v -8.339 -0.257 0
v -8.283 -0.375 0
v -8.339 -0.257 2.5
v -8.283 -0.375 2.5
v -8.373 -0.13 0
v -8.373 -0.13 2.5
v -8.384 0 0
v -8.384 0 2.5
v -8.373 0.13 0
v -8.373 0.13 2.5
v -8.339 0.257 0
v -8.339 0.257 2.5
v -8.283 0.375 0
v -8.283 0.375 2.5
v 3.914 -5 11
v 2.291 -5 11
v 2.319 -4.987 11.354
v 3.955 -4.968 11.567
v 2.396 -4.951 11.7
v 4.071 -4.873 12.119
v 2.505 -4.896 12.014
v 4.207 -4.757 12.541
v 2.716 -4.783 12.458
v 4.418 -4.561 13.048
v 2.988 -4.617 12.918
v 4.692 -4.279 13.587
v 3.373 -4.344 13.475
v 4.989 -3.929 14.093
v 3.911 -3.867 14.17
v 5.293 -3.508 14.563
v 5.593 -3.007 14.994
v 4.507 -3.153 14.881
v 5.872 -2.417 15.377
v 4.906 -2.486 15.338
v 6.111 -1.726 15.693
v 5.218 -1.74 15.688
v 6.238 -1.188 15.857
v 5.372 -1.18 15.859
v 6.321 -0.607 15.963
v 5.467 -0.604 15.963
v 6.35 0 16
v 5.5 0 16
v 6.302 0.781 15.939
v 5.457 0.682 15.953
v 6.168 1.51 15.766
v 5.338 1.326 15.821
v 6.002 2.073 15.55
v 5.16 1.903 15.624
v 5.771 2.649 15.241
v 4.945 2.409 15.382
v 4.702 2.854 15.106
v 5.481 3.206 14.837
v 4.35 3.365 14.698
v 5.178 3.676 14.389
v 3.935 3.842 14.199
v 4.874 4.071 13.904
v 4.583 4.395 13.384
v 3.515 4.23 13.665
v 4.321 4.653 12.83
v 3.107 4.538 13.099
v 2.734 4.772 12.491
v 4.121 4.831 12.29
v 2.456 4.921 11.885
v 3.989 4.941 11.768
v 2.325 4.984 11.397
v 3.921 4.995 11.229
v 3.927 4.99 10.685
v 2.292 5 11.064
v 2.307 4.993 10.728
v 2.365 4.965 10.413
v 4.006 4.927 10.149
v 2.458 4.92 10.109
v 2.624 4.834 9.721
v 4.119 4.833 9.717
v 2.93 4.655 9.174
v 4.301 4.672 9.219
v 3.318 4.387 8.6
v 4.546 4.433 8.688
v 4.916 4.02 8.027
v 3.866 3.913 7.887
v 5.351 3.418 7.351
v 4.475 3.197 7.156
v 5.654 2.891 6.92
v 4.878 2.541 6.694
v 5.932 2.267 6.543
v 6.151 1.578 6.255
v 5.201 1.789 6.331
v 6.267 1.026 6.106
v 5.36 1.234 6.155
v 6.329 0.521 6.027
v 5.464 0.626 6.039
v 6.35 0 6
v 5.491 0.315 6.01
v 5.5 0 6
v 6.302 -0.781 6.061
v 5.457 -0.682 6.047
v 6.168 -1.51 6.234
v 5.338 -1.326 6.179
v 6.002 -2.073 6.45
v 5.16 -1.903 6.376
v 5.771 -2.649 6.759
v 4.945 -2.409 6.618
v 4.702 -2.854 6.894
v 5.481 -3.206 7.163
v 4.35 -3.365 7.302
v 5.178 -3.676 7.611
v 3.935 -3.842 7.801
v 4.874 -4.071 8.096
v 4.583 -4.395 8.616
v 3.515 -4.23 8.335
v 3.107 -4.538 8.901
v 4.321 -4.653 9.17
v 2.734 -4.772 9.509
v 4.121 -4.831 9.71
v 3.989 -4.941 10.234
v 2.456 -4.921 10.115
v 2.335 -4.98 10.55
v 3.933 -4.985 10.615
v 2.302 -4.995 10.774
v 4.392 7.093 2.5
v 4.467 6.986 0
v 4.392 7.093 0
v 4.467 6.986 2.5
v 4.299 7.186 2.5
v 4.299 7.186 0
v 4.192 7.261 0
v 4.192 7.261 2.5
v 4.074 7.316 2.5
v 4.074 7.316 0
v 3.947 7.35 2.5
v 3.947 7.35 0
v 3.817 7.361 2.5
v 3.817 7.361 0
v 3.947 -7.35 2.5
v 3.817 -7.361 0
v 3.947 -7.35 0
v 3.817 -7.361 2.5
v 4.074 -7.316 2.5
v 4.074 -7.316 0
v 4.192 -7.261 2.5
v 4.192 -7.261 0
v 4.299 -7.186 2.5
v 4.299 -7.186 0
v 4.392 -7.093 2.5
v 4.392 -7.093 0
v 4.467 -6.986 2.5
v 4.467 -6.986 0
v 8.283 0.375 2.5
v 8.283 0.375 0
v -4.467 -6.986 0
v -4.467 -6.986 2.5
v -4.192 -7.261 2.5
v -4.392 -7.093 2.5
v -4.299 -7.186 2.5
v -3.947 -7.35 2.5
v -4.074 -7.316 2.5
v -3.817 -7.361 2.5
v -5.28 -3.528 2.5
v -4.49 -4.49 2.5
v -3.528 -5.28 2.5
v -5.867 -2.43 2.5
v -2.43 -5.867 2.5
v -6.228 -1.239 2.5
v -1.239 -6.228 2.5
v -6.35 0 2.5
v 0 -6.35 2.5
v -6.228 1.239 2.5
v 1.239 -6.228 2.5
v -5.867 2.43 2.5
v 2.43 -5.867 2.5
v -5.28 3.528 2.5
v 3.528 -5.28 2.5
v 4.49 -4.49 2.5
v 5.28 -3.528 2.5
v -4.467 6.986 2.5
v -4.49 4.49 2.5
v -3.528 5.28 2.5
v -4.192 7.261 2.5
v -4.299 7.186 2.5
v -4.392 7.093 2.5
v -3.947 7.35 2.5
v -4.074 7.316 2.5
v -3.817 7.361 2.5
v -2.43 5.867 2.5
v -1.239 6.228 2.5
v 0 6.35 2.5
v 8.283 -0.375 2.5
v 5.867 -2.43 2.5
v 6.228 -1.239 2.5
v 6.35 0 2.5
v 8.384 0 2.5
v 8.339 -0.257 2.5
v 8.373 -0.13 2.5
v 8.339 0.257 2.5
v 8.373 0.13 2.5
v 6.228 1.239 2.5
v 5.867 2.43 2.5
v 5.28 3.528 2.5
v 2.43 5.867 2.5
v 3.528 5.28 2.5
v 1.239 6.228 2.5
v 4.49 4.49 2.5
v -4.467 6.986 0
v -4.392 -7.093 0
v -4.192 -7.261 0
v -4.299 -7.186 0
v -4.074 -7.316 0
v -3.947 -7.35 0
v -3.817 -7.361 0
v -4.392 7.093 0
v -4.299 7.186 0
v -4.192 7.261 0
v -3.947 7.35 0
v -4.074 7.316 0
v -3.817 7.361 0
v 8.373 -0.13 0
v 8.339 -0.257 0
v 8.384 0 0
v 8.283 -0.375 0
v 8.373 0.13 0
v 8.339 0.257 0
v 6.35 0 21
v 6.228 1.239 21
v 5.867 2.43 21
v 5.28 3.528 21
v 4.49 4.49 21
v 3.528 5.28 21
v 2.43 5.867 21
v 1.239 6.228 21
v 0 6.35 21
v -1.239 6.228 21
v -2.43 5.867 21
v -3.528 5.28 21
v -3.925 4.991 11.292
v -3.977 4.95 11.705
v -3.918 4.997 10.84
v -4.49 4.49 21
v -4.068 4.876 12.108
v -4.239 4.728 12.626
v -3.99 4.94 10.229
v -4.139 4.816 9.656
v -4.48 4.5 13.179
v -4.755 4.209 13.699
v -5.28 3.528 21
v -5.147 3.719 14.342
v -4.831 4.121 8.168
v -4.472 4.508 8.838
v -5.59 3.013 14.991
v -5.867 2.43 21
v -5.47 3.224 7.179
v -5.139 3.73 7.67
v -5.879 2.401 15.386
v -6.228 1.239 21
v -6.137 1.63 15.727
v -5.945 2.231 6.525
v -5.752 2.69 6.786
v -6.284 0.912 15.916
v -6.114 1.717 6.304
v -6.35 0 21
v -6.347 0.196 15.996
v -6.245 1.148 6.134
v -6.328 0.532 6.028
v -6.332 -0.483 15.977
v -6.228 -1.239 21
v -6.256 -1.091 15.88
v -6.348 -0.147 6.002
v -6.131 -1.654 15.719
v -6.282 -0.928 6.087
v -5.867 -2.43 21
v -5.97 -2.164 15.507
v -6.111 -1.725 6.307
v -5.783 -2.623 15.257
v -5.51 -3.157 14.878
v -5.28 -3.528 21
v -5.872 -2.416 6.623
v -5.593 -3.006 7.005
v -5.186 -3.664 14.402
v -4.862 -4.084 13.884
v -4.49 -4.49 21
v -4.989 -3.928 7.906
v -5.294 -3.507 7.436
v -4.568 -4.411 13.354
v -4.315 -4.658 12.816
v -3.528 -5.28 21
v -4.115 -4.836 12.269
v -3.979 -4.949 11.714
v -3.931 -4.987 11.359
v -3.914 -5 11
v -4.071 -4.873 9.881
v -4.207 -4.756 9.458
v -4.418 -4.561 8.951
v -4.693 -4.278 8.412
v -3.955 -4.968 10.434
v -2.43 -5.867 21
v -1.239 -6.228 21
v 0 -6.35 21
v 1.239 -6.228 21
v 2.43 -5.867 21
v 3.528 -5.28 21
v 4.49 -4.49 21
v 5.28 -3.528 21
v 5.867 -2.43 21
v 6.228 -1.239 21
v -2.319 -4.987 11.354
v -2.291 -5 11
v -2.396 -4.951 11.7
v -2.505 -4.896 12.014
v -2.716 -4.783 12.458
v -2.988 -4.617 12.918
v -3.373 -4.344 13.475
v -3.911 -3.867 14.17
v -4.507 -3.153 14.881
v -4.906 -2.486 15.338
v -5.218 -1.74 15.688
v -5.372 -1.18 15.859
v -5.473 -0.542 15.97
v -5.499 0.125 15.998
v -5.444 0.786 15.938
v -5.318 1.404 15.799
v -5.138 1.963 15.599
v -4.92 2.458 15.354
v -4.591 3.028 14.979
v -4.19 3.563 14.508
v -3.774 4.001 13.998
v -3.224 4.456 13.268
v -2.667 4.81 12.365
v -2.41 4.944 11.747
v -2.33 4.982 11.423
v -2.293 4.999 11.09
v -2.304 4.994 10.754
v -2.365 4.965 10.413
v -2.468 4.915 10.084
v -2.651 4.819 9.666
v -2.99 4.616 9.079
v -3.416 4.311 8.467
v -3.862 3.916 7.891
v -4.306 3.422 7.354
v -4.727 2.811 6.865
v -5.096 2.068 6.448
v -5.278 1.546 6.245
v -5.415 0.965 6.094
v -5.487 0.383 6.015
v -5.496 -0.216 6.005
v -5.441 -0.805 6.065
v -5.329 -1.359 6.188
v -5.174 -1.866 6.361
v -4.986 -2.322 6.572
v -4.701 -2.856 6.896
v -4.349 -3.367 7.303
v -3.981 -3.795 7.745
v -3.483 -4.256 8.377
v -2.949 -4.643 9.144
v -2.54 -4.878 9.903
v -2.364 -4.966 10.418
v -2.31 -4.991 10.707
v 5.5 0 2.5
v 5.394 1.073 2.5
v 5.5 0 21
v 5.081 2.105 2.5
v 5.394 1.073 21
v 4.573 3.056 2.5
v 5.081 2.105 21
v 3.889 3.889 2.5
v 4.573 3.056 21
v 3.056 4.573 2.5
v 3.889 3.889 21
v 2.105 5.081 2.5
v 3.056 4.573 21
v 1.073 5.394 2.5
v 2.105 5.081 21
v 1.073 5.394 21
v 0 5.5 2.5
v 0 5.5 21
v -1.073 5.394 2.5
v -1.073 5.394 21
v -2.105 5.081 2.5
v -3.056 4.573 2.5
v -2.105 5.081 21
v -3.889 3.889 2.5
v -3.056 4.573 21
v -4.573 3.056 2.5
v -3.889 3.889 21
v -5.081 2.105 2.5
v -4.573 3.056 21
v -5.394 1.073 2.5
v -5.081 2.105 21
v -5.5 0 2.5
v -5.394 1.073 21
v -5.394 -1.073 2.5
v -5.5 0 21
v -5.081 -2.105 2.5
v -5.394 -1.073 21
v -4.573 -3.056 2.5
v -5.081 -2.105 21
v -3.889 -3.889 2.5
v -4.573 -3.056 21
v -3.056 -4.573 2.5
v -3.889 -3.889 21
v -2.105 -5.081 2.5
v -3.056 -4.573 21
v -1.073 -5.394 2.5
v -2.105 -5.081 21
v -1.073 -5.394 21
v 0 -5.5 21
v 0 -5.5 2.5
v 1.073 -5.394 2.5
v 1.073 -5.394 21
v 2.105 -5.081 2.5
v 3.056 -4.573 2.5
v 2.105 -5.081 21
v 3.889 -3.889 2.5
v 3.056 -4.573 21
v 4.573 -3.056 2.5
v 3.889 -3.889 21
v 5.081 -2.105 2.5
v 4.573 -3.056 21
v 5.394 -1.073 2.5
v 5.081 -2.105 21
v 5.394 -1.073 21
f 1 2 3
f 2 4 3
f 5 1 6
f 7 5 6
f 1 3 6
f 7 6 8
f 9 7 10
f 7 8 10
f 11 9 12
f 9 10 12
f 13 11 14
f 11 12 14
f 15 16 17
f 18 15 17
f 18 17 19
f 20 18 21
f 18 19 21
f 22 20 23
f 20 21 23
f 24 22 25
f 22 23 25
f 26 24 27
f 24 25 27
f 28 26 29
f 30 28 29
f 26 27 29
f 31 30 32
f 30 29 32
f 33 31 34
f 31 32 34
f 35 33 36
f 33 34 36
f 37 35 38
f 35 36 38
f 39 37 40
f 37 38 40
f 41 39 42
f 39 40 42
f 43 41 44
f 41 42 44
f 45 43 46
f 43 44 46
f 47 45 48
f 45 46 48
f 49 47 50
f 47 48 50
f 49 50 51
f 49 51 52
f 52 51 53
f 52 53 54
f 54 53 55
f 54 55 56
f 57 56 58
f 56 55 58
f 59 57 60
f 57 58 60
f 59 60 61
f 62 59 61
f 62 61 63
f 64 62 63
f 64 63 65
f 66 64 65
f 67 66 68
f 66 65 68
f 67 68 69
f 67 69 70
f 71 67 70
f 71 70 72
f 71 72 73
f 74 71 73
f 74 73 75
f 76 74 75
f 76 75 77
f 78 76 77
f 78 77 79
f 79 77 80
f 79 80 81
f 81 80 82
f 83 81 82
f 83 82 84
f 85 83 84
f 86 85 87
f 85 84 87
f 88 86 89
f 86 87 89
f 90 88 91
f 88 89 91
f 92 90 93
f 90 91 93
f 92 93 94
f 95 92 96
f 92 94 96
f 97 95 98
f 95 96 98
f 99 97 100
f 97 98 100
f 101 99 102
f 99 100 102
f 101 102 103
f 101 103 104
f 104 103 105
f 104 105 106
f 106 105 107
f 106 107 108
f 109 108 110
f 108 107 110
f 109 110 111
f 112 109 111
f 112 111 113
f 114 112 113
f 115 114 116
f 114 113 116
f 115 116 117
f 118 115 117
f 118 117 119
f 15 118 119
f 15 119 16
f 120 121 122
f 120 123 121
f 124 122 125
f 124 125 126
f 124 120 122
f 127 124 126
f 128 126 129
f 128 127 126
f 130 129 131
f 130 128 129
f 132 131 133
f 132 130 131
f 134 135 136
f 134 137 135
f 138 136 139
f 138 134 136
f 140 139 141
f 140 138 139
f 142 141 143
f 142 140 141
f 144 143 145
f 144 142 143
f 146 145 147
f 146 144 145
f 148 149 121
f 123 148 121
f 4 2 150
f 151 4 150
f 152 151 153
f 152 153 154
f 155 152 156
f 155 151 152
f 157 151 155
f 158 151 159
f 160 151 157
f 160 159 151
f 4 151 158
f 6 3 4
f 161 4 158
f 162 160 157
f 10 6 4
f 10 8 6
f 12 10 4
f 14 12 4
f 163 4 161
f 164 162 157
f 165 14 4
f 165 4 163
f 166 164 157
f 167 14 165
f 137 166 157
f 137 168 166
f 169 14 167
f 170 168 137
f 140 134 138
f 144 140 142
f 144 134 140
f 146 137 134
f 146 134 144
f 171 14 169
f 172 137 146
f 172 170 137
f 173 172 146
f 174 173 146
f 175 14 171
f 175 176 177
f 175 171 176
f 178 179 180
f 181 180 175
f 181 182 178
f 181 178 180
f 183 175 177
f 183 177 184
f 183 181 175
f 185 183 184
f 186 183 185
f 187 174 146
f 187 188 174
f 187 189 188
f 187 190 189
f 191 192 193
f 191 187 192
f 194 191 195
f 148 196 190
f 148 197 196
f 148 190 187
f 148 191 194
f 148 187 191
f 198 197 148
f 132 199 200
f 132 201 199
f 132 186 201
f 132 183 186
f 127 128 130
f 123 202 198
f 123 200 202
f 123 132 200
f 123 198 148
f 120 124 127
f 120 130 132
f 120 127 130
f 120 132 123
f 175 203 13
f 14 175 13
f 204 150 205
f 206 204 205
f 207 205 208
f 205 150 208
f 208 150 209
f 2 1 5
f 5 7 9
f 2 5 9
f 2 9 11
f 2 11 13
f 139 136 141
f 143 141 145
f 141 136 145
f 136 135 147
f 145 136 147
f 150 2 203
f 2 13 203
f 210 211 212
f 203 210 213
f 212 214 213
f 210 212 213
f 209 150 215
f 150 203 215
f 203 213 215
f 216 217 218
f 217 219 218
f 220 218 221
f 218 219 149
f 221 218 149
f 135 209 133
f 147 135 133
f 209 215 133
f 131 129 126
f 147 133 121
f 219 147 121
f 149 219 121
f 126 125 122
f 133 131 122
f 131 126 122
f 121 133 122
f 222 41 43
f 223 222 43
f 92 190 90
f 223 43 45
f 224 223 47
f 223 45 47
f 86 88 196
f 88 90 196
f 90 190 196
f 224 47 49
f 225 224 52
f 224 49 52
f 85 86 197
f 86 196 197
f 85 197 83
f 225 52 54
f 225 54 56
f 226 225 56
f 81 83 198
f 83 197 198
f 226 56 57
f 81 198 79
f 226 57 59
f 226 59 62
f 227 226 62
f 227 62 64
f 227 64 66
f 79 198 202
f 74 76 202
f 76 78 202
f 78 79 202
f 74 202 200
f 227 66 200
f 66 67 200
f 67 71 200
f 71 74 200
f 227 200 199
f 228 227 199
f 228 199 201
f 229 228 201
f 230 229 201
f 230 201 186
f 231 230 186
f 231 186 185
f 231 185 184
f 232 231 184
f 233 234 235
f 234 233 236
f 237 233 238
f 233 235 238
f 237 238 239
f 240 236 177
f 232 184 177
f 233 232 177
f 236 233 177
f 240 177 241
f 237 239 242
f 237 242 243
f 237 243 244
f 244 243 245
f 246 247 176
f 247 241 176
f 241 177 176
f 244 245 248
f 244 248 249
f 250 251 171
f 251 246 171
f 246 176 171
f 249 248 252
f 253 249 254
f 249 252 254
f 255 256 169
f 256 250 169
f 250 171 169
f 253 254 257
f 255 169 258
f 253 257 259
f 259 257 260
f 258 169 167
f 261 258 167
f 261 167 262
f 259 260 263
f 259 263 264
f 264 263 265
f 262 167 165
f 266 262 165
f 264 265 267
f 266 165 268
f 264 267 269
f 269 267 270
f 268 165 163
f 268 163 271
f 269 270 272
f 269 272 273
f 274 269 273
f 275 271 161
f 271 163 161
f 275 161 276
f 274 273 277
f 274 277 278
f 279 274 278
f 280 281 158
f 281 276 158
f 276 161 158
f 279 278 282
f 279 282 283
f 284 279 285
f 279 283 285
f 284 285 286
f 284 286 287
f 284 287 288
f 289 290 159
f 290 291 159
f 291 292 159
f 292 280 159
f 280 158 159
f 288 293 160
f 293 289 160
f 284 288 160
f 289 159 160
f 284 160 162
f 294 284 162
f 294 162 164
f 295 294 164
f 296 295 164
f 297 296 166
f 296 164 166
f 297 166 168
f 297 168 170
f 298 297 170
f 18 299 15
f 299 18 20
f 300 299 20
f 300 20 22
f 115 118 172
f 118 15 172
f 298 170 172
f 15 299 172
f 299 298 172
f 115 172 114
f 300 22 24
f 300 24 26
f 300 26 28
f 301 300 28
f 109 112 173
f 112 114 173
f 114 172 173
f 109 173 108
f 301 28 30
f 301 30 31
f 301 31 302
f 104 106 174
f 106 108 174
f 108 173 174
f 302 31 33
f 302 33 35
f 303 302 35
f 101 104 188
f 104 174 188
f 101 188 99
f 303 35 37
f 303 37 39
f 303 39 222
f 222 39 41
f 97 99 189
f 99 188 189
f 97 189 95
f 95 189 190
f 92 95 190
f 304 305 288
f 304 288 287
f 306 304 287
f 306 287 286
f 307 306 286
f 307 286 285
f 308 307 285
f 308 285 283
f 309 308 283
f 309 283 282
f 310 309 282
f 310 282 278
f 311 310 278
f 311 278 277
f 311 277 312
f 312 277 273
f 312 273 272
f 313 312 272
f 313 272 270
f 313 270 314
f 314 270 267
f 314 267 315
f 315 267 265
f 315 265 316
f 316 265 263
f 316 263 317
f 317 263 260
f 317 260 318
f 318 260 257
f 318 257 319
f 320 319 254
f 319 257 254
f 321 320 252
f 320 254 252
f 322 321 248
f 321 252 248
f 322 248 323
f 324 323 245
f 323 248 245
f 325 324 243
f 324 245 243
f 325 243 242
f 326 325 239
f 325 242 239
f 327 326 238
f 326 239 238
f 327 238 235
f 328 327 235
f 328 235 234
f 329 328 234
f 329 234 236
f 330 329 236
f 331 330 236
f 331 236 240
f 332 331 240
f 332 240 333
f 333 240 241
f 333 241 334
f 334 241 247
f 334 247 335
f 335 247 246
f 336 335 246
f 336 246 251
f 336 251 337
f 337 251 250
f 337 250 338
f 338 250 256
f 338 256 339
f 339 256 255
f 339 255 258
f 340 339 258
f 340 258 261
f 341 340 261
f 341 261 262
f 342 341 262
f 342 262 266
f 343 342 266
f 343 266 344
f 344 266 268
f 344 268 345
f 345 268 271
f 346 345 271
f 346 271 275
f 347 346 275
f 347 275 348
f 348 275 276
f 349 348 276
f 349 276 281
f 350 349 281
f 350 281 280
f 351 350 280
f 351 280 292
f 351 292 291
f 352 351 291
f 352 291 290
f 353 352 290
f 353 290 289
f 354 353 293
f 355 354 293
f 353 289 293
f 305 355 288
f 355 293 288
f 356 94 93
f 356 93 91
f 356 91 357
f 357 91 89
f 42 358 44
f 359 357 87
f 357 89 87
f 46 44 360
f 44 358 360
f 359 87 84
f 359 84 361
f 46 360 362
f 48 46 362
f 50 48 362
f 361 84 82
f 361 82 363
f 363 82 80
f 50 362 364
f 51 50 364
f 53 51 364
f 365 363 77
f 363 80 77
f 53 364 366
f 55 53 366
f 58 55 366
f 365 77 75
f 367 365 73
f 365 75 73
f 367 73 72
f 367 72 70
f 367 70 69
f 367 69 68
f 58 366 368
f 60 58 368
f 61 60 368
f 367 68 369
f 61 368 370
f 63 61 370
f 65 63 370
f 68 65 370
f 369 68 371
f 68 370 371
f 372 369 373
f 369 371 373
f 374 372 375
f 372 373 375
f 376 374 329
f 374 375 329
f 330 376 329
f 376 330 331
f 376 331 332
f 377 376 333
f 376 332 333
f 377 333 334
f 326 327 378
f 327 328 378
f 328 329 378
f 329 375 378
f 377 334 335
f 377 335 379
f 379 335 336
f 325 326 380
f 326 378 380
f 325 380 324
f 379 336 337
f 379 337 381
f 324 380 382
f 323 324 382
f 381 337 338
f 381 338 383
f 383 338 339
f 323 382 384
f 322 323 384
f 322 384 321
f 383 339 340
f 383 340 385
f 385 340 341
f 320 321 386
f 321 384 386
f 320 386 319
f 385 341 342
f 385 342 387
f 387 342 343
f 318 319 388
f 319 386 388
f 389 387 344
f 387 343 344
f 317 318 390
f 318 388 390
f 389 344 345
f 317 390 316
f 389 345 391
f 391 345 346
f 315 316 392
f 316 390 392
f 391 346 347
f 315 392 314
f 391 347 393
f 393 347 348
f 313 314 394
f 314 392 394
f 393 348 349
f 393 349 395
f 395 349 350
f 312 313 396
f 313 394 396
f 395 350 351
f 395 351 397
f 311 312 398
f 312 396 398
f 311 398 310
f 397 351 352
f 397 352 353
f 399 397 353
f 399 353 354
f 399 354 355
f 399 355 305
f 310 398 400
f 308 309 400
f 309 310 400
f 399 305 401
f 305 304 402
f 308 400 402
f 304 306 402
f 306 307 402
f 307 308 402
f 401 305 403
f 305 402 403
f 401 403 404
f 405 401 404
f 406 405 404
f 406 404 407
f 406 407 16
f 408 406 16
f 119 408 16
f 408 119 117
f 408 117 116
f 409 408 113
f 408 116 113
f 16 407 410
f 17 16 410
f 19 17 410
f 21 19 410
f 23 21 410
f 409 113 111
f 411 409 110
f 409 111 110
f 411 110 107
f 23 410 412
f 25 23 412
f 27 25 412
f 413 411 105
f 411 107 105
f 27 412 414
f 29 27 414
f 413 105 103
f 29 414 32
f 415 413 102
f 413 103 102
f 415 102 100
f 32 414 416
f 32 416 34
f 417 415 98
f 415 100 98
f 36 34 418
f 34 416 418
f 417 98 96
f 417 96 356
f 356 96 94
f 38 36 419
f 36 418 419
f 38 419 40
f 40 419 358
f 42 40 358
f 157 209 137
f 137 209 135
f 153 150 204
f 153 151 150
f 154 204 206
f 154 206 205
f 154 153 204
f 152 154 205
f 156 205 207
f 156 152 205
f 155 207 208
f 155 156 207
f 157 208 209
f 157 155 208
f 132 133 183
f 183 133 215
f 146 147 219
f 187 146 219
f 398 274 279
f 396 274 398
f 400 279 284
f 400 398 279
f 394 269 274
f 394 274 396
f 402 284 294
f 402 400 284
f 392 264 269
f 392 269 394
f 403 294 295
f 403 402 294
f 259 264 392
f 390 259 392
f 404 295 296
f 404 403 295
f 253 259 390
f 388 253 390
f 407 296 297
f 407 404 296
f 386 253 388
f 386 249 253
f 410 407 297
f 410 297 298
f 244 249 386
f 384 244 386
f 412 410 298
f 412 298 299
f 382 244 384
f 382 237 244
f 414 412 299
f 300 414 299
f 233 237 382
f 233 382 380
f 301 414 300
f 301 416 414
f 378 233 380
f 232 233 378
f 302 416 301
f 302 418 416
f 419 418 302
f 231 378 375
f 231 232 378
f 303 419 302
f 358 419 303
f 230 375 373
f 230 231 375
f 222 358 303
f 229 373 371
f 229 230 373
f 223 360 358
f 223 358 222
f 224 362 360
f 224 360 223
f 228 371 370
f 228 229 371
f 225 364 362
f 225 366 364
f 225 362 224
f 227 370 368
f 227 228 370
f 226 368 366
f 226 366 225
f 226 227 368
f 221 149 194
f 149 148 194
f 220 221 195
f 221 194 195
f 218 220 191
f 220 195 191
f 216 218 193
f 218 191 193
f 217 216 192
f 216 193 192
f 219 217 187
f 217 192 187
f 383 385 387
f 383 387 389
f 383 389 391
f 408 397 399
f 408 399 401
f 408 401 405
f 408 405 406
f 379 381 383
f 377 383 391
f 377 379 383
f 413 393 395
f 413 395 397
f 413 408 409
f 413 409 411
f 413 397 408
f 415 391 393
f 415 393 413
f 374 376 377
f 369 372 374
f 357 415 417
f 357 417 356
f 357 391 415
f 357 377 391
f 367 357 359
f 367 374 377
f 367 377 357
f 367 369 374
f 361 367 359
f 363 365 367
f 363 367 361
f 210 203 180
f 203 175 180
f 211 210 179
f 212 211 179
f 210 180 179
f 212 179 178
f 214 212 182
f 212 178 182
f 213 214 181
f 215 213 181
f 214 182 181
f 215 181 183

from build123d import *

# Parameters (mm, degrees)
BOSS_EXTRUDE1_DEPTH = 2.5
SKETCH2_R           = 6.35
BOSS_EXTRUDE2_DEPTH = 18.5
SKETCH3_R           = 5.5
CUT_EXTRUDE3_DEPTH  = 18.5
SKETCH4_R           = 5
CUT_EXTRUDE4_DEPTH  = 27.752756867
FILLET1_R           = 0.75


with BuildPart() as part:
    # Sketch1 → Boss-Extrude1 (new body)
    with BuildSketch(Plane.XY):
        Polygon((8.5, 0), (4.25, 7.361215932), (-4.25, 7.361215932), (-8.5, 0), (-4.25, -7.361215932), (4.25, -7.361215932), align=None)
    extrude(amount=BOSS_EXTRUDE1_DEPTH)

    # Sketch2 → Boss-Extrude2 (add)
    with BuildSketch(Plane.XY.offset(2.5)):
        Circle(SKETCH2_R)
    extrude(amount=BOSS_EXTRUDE2_DEPTH)

    # Sketch3 → Cut-Extrude3 (cut)
    with BuildSketch(Plane.XY.offset(21)):
        Circle(SKETCH3_R)
    extrude(amount=-CUT_EXTRUDE3_DEPTH, mode=Mode.SUBTRACT)

    # Sketch4 → Cut-Extrude4 (cut, through all)
    with BuildSketch(Plane.ZY.offset(6.35)):
        with Locations(Location((11, 0, 0), (0, 0, 270))):
            Circle(SKETCH4_R)
    extrude(amount=-CUT_EXTRUDE4_DEPTH, mode=Mode.SUBTRACT)

    # Fillet1
    fillet1_edges = [part.edges().sort_by_distance(p)[0] for p in [
        (4.25, -7.361215932, 1.25),
        (-4.25, -7.361215932, 1.25),
        (-8.5, 0, 1.25),
        (-4.25, 7.361215932, 1.25),
        (4.25, 7.361215932, 1.25),
        (8.5, 0, 1.25),
    ]]
    fillet(fillet1_edges, radius=FILLET1_R)


solid = part.part
